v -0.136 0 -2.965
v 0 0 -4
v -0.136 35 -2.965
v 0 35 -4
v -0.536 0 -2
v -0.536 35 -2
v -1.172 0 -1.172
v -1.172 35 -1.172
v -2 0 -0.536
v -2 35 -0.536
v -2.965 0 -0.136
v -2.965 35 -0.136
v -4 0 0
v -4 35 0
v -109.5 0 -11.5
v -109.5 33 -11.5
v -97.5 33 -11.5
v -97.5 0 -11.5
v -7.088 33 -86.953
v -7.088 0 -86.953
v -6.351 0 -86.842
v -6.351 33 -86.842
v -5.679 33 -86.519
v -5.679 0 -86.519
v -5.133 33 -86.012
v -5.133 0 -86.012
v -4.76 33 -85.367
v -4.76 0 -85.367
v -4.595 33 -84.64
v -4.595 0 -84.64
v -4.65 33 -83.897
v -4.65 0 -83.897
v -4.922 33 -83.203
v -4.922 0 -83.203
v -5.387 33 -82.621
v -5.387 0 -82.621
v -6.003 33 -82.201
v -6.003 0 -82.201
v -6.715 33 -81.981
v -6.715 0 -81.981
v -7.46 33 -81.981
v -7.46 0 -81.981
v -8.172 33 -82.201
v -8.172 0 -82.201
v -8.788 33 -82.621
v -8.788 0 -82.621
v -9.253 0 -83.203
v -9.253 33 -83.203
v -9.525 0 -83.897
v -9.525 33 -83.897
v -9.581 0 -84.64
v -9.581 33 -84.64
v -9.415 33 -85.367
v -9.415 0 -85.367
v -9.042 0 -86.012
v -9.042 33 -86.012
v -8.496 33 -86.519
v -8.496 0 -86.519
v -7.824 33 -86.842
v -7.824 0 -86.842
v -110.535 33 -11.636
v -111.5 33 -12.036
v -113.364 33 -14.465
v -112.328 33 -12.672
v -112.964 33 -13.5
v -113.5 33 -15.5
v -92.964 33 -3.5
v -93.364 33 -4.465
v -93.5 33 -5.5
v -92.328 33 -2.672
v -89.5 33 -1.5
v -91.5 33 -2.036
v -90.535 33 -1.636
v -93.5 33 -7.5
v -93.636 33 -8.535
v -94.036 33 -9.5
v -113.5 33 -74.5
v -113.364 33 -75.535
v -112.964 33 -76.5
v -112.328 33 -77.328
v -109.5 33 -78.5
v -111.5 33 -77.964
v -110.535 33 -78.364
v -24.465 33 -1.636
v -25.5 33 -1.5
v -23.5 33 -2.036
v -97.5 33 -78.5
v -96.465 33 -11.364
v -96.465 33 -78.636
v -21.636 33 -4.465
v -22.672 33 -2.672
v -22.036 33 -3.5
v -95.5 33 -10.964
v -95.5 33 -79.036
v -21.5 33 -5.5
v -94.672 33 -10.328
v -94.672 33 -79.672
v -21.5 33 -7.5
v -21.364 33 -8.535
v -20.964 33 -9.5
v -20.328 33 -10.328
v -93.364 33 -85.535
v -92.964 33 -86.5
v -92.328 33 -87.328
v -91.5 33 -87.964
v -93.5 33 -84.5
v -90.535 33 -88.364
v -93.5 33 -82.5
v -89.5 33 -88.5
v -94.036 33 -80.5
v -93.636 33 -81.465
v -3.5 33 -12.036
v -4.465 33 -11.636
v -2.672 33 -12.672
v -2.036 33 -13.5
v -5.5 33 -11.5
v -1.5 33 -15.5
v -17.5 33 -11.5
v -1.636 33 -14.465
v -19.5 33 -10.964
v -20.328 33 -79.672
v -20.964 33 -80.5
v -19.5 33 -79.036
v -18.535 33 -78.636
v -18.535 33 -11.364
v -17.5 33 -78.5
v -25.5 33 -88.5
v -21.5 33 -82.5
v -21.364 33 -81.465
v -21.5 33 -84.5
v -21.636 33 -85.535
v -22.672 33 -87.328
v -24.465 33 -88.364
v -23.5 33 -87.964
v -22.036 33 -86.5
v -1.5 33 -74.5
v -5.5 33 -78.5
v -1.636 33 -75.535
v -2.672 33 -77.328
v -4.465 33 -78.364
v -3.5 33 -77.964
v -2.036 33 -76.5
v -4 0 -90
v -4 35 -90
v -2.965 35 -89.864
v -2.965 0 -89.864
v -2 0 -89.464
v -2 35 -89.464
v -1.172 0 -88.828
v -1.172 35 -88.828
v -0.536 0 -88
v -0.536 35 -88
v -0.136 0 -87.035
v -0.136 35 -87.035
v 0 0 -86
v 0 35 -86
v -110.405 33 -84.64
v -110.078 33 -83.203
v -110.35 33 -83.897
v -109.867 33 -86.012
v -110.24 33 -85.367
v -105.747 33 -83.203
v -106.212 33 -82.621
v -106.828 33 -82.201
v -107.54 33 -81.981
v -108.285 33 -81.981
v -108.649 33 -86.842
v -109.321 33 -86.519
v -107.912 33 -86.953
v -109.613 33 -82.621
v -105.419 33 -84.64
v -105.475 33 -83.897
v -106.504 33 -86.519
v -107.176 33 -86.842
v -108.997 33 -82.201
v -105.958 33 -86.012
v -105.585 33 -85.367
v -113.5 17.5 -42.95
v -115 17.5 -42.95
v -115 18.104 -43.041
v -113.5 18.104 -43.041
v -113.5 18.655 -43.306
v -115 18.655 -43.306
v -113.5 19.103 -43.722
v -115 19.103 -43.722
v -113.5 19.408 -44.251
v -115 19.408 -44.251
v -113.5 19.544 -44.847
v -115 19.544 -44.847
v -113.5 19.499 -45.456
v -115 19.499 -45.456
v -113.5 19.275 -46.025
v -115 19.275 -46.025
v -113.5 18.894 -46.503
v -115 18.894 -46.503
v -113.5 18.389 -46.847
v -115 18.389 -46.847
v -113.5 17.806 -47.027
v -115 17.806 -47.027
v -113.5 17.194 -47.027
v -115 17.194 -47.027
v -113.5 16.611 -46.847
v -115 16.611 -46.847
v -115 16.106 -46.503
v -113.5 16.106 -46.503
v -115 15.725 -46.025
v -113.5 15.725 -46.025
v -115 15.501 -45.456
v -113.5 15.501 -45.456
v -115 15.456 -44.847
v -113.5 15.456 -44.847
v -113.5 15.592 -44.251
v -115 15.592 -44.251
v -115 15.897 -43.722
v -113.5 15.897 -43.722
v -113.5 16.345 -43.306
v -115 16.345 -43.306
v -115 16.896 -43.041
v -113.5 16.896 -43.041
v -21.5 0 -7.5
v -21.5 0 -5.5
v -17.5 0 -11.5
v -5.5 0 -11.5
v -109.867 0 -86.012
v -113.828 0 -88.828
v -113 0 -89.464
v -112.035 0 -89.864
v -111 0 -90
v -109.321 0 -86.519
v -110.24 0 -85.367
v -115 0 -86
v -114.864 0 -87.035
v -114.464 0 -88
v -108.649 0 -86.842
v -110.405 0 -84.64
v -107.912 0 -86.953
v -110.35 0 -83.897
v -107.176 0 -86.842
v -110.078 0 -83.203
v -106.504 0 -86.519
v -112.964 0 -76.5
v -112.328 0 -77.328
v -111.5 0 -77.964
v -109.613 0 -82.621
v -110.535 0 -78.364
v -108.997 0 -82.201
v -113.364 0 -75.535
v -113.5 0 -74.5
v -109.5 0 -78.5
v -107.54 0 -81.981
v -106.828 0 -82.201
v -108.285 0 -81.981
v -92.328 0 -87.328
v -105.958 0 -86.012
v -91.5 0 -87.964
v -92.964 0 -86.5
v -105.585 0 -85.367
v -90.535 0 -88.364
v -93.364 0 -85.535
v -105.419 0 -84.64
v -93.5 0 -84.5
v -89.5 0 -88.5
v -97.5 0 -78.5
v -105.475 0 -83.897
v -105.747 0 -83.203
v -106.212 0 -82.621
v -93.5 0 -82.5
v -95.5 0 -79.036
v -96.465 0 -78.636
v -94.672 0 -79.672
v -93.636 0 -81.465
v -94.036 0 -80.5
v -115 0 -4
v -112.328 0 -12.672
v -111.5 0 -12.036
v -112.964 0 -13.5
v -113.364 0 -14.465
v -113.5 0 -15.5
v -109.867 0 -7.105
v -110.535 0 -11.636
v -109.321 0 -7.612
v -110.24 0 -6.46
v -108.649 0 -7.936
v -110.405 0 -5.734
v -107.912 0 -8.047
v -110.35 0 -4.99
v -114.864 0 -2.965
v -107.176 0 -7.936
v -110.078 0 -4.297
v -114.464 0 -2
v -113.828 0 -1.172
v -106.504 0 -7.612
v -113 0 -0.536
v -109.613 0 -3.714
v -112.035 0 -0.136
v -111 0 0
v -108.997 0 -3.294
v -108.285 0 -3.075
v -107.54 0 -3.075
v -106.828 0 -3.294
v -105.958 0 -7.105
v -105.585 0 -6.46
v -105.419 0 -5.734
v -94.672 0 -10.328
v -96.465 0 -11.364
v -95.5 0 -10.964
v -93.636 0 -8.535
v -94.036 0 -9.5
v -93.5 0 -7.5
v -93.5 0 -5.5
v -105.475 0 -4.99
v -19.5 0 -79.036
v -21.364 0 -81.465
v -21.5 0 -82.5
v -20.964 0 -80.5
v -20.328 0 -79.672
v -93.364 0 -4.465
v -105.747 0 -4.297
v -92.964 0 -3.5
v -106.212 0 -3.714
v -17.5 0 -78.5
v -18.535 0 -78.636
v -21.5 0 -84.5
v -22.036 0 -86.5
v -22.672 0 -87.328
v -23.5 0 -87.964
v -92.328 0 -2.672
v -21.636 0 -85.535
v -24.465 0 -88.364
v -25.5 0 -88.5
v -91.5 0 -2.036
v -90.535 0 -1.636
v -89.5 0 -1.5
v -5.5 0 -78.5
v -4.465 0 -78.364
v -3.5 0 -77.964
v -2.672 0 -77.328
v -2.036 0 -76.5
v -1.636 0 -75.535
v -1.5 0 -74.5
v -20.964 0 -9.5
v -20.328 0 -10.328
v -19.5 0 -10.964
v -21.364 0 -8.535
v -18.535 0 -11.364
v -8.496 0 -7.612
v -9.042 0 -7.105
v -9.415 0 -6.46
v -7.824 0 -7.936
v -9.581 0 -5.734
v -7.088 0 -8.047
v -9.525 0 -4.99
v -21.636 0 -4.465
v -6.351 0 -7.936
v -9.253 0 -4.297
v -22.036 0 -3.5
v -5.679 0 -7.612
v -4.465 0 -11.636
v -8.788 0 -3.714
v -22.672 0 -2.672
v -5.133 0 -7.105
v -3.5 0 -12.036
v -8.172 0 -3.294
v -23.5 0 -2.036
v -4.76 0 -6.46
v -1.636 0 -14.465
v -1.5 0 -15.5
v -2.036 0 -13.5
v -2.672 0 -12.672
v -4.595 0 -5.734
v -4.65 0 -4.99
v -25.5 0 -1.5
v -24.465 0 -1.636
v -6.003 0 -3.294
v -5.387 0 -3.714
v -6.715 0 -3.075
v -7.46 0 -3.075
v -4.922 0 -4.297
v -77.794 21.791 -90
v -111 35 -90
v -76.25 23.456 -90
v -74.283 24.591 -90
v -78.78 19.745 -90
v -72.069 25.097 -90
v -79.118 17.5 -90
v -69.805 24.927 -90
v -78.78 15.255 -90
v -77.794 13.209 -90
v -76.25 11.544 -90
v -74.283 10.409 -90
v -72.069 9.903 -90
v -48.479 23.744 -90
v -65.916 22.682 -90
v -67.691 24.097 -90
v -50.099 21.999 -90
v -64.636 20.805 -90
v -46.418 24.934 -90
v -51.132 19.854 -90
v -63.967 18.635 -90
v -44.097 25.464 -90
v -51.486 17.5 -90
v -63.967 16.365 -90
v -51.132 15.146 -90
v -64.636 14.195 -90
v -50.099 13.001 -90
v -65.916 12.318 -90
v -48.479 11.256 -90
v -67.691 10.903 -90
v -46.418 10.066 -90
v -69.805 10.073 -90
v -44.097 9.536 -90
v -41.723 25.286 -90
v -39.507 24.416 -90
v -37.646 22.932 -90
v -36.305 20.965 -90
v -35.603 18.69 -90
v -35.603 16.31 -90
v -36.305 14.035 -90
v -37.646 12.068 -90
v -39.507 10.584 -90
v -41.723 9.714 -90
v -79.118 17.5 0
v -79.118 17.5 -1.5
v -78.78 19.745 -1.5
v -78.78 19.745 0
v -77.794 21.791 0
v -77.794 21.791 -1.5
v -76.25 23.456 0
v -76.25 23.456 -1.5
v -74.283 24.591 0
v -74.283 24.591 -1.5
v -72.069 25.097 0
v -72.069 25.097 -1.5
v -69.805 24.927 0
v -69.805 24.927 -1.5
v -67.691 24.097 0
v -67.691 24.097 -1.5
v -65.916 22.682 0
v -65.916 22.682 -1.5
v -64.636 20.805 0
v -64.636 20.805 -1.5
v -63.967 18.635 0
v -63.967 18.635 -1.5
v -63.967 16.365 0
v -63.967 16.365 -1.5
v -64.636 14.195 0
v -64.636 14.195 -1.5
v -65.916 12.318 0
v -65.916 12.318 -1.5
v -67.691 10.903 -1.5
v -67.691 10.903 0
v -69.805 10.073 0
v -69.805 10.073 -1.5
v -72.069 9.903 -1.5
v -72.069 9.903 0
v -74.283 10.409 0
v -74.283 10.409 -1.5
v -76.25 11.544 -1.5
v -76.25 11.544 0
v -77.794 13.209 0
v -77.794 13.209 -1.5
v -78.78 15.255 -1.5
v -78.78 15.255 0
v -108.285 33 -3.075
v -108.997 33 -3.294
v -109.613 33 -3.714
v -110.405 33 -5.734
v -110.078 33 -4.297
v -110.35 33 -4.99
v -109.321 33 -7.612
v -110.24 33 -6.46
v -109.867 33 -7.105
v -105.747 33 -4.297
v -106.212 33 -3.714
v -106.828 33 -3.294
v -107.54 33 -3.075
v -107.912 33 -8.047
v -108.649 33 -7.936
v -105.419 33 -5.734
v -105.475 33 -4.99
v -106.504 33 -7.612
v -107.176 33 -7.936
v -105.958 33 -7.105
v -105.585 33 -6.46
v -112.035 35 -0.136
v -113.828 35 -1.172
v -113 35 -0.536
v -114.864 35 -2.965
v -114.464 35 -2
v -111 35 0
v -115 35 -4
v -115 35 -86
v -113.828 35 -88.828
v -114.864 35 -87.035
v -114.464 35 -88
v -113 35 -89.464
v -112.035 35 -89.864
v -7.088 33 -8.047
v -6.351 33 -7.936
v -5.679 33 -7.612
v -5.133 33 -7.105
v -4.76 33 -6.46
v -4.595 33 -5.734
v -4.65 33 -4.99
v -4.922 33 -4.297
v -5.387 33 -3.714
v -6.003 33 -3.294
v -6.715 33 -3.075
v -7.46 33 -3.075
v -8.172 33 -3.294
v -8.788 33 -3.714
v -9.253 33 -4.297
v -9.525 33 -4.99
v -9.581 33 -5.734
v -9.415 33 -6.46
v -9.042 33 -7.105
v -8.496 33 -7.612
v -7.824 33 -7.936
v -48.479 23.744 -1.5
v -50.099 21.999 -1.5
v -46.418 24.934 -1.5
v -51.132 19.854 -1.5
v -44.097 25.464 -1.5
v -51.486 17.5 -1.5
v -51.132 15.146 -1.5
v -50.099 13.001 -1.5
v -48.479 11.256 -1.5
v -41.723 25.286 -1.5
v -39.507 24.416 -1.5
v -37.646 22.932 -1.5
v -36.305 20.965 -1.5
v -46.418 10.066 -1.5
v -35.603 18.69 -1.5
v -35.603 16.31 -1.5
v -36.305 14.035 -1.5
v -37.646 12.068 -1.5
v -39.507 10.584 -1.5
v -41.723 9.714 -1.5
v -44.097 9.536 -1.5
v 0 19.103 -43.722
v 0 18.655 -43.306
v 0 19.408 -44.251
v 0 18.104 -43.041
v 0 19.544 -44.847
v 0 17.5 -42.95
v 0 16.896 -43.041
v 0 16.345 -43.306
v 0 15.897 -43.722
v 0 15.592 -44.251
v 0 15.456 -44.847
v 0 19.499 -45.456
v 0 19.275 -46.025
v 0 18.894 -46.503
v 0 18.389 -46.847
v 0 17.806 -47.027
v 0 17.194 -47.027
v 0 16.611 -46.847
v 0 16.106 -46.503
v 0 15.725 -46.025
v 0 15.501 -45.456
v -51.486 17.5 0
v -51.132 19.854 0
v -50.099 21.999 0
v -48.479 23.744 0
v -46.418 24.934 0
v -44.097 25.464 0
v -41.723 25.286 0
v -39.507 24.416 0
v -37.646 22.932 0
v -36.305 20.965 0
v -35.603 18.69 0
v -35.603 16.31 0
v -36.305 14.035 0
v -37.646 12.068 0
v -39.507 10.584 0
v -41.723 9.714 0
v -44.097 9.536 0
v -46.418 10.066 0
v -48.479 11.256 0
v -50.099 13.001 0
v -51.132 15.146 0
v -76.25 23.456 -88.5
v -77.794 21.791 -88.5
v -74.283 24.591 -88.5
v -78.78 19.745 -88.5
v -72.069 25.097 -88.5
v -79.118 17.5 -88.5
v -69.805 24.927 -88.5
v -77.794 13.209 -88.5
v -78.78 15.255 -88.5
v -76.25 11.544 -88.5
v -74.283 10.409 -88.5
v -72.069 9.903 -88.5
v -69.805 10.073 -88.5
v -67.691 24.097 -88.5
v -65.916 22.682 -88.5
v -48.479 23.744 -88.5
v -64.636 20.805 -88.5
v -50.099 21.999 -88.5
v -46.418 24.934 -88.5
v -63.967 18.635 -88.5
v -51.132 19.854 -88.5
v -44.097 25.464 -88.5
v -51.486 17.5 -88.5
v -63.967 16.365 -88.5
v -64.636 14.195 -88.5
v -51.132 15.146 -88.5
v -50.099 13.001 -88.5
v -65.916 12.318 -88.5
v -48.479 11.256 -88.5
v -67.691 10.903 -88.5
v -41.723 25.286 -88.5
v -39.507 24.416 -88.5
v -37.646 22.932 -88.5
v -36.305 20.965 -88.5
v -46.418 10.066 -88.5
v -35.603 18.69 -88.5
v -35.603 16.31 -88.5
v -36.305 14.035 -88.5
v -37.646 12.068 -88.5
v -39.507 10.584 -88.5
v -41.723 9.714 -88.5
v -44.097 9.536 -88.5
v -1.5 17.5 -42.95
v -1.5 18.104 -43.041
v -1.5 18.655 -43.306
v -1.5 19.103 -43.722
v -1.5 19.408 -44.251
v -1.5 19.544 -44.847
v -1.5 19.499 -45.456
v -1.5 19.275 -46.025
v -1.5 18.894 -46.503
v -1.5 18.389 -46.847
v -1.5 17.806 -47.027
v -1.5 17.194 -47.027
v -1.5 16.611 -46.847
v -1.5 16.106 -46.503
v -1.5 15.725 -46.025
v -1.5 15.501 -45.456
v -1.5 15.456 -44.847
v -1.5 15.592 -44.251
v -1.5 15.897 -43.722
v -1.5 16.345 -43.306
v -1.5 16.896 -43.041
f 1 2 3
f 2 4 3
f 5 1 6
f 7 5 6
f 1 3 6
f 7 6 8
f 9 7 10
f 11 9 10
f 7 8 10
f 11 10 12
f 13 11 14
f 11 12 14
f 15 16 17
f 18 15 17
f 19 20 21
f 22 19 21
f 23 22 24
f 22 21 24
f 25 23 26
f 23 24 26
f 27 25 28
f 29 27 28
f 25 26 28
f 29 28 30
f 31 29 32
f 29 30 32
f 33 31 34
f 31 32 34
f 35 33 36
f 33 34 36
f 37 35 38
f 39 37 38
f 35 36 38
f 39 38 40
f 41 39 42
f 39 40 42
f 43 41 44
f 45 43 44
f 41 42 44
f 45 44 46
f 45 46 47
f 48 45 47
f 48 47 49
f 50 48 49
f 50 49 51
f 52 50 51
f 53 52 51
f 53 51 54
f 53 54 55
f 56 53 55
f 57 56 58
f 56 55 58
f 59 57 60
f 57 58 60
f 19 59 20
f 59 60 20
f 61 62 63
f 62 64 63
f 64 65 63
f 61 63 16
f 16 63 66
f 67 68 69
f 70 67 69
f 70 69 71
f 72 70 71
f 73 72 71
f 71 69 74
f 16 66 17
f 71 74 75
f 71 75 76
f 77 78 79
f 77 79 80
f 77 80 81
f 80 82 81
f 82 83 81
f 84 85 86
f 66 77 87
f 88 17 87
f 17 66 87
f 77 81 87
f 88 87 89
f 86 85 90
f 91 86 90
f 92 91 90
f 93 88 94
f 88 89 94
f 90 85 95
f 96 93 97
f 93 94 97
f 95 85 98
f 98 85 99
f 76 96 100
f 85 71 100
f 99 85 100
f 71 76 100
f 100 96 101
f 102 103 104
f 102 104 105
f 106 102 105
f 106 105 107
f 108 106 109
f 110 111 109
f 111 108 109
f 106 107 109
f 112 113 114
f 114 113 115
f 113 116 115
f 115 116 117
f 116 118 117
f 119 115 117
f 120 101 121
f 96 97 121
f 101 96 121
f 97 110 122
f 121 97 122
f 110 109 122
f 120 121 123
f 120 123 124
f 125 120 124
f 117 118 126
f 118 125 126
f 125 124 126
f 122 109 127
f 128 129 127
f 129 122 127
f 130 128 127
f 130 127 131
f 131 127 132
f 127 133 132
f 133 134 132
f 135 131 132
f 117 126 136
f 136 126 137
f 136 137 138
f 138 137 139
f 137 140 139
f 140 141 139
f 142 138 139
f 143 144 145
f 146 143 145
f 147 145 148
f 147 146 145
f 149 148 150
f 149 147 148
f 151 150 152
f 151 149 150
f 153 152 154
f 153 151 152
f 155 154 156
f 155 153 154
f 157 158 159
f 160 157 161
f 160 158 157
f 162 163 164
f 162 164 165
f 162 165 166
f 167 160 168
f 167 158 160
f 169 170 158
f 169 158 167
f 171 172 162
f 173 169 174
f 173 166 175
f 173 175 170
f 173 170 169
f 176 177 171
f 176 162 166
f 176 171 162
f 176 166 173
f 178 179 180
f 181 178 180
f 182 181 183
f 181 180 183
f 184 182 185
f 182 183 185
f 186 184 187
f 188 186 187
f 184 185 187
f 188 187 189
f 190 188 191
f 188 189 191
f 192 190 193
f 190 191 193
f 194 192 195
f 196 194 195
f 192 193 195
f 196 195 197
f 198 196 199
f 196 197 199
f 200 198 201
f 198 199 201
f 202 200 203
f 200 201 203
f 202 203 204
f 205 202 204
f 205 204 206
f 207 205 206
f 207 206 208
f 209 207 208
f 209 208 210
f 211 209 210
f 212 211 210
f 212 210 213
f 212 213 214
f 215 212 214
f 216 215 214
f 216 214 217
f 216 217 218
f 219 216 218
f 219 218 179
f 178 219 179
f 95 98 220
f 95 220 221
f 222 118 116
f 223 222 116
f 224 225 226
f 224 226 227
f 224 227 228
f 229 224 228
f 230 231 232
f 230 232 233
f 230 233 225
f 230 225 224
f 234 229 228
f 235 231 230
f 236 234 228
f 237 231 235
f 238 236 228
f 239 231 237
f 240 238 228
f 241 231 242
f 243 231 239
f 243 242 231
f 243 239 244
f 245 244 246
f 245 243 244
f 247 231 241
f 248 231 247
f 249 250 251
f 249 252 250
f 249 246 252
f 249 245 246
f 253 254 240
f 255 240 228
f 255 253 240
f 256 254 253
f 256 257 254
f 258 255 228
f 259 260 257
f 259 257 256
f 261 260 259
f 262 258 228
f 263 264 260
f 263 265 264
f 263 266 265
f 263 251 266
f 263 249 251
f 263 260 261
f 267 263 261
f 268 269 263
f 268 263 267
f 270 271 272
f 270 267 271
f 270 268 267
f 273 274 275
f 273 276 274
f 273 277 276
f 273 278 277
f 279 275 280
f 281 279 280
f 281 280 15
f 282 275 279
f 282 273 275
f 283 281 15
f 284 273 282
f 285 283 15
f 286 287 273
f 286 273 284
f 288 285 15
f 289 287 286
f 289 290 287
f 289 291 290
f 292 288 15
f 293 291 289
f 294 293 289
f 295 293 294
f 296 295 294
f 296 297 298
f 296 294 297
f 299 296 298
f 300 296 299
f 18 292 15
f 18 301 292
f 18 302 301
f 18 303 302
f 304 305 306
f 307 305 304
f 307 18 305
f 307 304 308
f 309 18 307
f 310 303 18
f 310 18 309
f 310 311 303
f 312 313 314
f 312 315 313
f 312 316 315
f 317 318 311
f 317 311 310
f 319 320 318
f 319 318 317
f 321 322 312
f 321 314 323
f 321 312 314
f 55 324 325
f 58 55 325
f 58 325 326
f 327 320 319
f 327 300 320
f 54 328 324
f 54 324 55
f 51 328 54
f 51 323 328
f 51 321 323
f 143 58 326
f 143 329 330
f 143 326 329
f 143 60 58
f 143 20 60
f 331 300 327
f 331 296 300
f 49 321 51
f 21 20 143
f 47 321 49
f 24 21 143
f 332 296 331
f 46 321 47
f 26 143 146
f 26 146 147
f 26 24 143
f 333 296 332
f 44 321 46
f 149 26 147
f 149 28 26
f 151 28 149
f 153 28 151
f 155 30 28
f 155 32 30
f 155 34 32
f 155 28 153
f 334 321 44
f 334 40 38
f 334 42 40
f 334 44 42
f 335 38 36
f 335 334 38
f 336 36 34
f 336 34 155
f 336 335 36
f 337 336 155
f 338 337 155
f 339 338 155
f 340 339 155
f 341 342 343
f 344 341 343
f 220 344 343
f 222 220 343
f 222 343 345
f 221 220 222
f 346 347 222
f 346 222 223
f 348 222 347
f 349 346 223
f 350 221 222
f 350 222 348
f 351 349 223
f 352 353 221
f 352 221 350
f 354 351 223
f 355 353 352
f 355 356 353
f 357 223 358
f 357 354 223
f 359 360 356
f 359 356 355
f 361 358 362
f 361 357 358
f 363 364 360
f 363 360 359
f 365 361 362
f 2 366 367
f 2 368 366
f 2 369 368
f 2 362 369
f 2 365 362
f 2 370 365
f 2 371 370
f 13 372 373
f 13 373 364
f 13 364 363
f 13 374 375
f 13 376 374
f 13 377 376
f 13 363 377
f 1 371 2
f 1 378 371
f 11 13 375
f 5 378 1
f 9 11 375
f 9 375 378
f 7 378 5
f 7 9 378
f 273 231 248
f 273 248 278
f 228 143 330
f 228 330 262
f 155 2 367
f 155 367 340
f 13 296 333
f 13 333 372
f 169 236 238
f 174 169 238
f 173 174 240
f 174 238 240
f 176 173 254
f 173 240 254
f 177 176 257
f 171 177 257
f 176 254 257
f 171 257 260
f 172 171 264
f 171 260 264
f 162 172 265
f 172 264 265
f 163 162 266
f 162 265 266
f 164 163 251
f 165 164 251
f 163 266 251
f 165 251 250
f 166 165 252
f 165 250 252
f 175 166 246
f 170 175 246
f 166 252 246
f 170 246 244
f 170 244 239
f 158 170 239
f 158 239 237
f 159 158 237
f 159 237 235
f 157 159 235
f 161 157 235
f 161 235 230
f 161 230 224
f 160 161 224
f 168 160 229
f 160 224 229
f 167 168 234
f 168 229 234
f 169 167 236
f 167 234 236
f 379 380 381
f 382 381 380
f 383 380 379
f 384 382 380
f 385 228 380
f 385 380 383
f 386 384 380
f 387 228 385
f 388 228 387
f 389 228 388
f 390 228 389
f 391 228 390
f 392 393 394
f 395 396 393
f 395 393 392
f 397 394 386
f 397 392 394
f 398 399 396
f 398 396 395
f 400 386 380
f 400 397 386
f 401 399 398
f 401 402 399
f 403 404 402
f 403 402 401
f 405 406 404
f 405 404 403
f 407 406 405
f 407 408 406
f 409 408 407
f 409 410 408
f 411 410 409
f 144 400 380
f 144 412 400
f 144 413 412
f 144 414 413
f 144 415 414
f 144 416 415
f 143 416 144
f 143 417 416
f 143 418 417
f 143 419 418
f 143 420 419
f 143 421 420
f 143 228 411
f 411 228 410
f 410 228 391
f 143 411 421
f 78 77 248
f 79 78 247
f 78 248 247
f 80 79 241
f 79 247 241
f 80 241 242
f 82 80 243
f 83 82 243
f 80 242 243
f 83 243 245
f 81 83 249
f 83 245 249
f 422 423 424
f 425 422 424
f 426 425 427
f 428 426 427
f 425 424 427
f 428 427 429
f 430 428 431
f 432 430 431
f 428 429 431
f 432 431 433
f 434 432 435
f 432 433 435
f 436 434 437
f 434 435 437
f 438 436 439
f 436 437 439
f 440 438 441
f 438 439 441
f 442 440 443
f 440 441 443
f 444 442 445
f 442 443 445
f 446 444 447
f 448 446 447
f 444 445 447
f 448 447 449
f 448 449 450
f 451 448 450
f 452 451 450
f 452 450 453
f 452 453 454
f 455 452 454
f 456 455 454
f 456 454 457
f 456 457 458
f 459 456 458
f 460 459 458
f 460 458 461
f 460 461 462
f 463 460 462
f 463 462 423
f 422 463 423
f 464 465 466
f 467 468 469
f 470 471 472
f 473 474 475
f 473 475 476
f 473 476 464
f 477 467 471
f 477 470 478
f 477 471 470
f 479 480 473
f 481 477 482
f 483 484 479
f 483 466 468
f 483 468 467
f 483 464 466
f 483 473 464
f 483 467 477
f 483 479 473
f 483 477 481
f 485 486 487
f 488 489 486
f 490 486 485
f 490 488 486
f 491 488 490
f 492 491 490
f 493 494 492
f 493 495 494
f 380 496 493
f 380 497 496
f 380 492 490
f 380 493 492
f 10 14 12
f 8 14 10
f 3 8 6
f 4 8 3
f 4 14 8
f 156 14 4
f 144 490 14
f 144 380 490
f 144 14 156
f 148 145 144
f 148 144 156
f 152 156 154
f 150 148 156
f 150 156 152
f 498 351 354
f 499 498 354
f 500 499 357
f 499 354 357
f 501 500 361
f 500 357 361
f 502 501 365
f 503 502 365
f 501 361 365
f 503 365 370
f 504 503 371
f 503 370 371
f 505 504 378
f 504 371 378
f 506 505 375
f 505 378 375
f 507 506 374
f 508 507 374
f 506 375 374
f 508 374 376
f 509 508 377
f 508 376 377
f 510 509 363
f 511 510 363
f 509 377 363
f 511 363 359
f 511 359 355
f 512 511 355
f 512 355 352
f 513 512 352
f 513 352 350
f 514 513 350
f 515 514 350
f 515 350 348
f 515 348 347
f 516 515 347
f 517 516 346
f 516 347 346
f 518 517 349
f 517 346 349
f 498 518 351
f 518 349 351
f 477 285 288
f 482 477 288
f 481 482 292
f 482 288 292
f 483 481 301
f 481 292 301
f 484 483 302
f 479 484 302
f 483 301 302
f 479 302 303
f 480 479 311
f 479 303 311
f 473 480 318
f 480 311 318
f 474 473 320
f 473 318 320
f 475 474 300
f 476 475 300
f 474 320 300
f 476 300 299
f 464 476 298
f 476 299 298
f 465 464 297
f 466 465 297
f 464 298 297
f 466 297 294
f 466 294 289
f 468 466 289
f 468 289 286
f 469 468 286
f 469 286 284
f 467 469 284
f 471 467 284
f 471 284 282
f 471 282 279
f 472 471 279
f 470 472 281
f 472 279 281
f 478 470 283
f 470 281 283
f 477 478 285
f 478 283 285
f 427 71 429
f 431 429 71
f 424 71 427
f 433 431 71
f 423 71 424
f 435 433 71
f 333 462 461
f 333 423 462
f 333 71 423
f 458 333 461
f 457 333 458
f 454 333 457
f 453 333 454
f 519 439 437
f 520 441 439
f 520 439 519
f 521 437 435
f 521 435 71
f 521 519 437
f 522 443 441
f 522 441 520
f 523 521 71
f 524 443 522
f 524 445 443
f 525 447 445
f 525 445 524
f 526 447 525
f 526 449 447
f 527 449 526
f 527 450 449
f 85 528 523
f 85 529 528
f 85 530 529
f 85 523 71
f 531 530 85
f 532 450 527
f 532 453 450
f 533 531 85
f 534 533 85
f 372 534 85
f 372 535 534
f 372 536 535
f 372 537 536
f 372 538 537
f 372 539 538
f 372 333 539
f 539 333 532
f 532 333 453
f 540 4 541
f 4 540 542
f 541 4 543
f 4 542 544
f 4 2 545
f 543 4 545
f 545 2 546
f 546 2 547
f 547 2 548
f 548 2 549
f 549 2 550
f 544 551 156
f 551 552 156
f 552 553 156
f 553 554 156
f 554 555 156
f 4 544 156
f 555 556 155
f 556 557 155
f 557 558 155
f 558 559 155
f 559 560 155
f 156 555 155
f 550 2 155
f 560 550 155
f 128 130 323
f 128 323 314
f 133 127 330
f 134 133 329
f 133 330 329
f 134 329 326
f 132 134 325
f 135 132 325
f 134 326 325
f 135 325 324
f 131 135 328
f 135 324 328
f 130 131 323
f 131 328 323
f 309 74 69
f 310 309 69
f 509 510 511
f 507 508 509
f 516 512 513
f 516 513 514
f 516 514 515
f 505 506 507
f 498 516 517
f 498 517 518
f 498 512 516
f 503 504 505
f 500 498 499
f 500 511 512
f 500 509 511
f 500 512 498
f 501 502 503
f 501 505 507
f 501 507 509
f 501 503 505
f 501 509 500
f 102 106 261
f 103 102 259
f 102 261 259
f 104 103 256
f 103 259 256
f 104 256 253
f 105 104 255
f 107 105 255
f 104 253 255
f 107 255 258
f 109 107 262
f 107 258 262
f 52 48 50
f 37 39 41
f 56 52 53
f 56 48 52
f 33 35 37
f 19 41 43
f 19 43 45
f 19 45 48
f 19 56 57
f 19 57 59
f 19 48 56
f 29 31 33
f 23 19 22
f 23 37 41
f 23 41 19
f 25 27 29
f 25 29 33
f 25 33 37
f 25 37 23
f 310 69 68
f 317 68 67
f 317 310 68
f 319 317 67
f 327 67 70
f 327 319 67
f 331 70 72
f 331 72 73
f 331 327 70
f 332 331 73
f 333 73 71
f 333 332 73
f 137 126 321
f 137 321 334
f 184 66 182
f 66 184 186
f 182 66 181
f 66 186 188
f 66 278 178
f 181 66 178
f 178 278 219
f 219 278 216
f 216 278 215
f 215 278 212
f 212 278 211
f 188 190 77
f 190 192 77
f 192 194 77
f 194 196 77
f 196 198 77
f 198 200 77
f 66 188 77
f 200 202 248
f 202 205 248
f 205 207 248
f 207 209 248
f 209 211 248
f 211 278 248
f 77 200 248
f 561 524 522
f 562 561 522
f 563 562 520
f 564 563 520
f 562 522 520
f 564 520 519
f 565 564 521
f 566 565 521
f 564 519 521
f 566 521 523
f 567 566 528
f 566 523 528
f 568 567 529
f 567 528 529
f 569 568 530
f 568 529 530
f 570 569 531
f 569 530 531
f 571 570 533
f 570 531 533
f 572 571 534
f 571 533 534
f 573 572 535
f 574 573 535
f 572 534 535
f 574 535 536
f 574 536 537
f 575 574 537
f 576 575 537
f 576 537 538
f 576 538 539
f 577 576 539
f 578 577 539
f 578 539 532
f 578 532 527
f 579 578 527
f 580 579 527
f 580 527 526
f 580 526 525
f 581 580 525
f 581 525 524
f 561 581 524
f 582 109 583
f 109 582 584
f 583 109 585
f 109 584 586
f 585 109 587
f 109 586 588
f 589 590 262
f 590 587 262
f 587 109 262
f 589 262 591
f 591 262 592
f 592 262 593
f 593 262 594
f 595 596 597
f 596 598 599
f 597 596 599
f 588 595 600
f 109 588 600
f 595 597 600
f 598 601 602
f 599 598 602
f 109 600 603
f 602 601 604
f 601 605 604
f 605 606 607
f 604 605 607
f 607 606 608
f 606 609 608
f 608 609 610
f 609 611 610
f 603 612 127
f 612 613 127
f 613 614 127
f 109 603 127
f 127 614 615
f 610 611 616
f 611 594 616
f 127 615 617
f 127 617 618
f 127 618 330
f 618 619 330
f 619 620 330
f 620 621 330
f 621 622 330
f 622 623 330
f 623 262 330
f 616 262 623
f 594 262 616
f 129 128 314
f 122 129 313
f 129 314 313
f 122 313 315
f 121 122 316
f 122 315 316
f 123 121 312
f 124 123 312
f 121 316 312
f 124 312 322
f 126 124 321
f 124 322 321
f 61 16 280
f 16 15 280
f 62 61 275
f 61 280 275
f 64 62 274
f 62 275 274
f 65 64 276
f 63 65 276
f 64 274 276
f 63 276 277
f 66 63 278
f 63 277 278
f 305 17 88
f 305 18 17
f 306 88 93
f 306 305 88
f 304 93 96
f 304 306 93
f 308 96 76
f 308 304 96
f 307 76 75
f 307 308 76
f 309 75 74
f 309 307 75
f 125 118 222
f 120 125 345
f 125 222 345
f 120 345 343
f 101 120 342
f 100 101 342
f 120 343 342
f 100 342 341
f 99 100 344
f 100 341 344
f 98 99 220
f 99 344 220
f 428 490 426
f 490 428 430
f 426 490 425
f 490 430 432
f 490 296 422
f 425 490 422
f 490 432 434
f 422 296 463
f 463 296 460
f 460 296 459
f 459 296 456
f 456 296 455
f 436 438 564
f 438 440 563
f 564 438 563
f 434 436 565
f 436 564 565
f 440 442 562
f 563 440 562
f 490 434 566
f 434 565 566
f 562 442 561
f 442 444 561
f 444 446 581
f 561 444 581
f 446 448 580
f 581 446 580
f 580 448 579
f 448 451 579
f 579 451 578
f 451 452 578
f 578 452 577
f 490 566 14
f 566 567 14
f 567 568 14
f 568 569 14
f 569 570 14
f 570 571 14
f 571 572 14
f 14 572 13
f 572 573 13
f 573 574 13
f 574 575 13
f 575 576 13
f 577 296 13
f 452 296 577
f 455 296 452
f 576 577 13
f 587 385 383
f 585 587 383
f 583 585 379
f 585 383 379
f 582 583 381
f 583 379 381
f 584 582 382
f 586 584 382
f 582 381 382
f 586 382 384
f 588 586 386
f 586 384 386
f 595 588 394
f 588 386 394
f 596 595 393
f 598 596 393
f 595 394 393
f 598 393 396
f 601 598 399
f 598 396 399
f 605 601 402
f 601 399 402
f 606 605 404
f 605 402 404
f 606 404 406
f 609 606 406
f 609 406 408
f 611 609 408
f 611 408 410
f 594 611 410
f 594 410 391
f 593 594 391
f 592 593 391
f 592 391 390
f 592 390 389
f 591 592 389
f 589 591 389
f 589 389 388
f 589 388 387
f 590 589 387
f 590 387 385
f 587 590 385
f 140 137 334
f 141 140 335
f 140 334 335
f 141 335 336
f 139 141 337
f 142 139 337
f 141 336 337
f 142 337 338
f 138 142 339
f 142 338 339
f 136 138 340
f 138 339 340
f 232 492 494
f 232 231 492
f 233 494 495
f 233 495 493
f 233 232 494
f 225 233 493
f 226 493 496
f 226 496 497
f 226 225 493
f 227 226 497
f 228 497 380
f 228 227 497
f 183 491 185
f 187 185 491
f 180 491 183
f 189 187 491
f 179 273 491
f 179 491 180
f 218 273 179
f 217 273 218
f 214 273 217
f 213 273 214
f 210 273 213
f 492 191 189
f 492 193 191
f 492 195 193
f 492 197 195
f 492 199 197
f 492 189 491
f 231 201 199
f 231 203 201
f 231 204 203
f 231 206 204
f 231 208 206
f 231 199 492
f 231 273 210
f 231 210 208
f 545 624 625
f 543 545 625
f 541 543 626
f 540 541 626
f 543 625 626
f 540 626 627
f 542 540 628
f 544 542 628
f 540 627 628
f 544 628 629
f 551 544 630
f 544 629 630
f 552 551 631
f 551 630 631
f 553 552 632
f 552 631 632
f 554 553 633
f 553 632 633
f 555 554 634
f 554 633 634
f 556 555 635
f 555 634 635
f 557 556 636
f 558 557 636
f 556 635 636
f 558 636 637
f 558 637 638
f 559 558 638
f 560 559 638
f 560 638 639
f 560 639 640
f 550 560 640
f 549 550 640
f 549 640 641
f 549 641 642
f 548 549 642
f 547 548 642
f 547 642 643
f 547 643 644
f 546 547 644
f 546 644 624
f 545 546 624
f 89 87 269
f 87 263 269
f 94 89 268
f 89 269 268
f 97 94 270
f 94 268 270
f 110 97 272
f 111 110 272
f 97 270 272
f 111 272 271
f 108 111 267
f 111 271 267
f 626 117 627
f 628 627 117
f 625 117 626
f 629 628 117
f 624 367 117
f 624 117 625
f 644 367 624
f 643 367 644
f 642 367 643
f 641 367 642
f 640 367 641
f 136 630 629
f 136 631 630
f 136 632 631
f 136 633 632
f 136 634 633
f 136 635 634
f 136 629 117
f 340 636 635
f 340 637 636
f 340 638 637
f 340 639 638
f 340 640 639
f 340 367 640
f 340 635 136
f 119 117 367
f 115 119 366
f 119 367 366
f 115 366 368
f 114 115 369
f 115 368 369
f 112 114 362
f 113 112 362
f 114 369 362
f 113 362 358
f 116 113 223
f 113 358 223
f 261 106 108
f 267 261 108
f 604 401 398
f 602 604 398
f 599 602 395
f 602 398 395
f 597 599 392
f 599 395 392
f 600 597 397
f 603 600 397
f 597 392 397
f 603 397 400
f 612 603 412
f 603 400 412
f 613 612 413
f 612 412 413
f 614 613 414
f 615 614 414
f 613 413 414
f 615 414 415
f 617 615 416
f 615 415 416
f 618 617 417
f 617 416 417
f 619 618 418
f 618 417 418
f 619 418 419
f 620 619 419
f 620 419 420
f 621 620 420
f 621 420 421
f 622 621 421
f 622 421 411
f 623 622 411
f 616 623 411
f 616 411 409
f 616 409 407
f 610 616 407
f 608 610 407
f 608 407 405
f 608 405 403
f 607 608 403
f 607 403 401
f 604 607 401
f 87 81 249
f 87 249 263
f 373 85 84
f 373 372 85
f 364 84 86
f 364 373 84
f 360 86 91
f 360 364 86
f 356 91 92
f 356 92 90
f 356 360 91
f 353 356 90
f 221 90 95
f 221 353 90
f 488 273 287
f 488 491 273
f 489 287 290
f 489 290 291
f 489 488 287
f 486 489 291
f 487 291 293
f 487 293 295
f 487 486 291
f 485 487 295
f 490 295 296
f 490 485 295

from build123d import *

# Parameters (mm, degrees)
SKETCH_1_W          = 115
SKETCH_1_H          = 90
SKETCH_1_W_2        = 112
SKETCH_1_H_2        = 87
EXTRUDE_1_DEPTH     = 35
SKETCH_3_W          = 115
SKETCH_3_H          = 90
EXTRUDE_2_DEPTH     = 2
SKETCH_4_W          = 20
SKETCH_4_H          = 10
EXTRUDE_3_DEPTH     = 33
FILLET_1_R          = 4
FILLET_2_R          = 4
SKETCH_6_R          = 2.5
CUT_EXTRUDE_1_DEPTH = 33
SKETCH_7_R          = 2.05
CUT_EXTRUDE_2_DEPTH = 170
SKETCH_8_R          = 7.986327153
SKETCH_8_R_2        = 7.617959365
CUT_EXTRUDE_3_DEPTH = 112


with BuildPart() as part:
    # Эскиз1 → Бобышка-Вытянуть1 (new body)
    with BuildSketch(Plane(origin=(0, 0, 0), x_dir=(1, 0, 0), z_dir=(0, 1, 0))):
        with Locations((-57.5, 45)):
            Rectangle(SKETCH_1_W, SKETCH_1_H)
        with Locations((-57.5, 45)):
            Rectangle(SKETCH_1_W_2, SKETCH_1_H_2, mode=Mode.SUBTRACT)
    extrude(amount=EXTRUDE_1_DEPTH)

    # Эскиз3 → Бобышка-Вытянуть2 (add)
    with BuildSketch(Plane(origin=(0, 35, 0), x_dir=(1, 0, 0), z_dir=(0, 1, 0))):
        with Locations((-57.5, 45)):
            Rectangle(SKETCH_3_W, SKETCH_3_H)
    extrude(amount=-EXTRUDE_2_DEPTH)

    # Эскиз4 → Бобышка-Вытянуть3 (add)
    with BuildSketch(Plane.XZ.offset(-33)):
        with Locations((-103.5, -6.5)):
            Rectangle(SKETCH_4_W, SKETCH_4_H)
        with Locations((-103.5, -83.5)):
            Rectangle(SKETCH_4_W, SKETCH_4_H)
        with Locations((-11.5, -83.5)):
            Rectangle(SKETCH_4_W, SKETCH_4_H)
        with Locations((-11.5, -6.5)):
            Rectangle(SKETCH_4_W, SKETCH_4_H)
    extrude(amount=EXTRUDE_3_DEPTH)

    # Скругление1
    fillet_1_edges = [part.edges().sort_by_distance(p)[0] for p in [
        (-113.5, 16.5, -11.5),
        (-93.5, 16.5, -11.5),
        (-93.5, 16.5, -1.5),
        (-113.5, 16.5, -78.5),
        (-93.5, 16.5, -88.5),
        (-93.5, 16.5, -78.5),
        (-1.5, 16.5, -78.5),
        (-21.5, 16.5, -78.5),
        (-21.5, 16.5, -88.5),
        (-1.5, 16.5, -11.5),
        (-21.5, 16.5, -1.5),
        (-21.5, 16.5, -11.5),
    ]]
    fillet(fillet_1_edges, radius=FILLET_1_R)

    # Скругление2
    fillet_2_edges = [part.edges().sort_by_distance(p)[0] for p in [
        (0, 17.5, 0),
        (-115, 17.5, 0),
        (-115, 17.5, -90),
        (0, 17.5, -90),
    ]]
    fillet(fillet_2_edges, radius=FILLET_2_R)

    # Эскиз6 → Вырез-Вытянуть1 (cut)
    with BuildSketch(Plane.XZ):
        with Locations(Location((-107.912454991, -5.546774355, 0), (0, 0, 270))):
            Circle(SKETCH_6_R)
        with Locations(Location((-7.087545009, -84.453225645, 0), (0, 0, 270))):
            Circle(SKETCH_6_R)
        with Locations(Location((-107.912454991, -84.453225645, 0), (0, 0, 270))):
            Circle(SKETCH_6_R)
        with Locations(Location((-7.087545009, -5.546774355, 0), (0, 0, 270))):
            Circle(SKETCH_6_R)
    extrude(amount=-CUT_EXTRUDE_1_DEPTH, mode=Mode.SUBTRACT)

    # Эскиз7 → Вырез-Вытянуть2 (cut)
    with BuildSketch(Plane.ZY.offset(115)):
        with Locations((-45, 17.5)):
            Circle(SKETCH_7_R)
    extrude(amount=-CUT_EXTRUDE_2_DEPTH, mode=Mode.SUBTRACT)

    # Эскиз8 → Вырез-Вытянуть3 (cut)
    with BuildSketch(Plane(origin=(0, 0, -90), x_dir=(-1, 0, 0), z_dir=(0, 0, -1))):
        with Locations((43.5, 17.5)):
            Circle(SKETCH_8_R)
        with Locations((71.5, 17.5)):
            Circle(SKETCH_8_R_2)
    extrude(amount=-CUT_EXTRUDE_3_DEPTH, mode=Mode.SUBTRACT)


solid = part.part
